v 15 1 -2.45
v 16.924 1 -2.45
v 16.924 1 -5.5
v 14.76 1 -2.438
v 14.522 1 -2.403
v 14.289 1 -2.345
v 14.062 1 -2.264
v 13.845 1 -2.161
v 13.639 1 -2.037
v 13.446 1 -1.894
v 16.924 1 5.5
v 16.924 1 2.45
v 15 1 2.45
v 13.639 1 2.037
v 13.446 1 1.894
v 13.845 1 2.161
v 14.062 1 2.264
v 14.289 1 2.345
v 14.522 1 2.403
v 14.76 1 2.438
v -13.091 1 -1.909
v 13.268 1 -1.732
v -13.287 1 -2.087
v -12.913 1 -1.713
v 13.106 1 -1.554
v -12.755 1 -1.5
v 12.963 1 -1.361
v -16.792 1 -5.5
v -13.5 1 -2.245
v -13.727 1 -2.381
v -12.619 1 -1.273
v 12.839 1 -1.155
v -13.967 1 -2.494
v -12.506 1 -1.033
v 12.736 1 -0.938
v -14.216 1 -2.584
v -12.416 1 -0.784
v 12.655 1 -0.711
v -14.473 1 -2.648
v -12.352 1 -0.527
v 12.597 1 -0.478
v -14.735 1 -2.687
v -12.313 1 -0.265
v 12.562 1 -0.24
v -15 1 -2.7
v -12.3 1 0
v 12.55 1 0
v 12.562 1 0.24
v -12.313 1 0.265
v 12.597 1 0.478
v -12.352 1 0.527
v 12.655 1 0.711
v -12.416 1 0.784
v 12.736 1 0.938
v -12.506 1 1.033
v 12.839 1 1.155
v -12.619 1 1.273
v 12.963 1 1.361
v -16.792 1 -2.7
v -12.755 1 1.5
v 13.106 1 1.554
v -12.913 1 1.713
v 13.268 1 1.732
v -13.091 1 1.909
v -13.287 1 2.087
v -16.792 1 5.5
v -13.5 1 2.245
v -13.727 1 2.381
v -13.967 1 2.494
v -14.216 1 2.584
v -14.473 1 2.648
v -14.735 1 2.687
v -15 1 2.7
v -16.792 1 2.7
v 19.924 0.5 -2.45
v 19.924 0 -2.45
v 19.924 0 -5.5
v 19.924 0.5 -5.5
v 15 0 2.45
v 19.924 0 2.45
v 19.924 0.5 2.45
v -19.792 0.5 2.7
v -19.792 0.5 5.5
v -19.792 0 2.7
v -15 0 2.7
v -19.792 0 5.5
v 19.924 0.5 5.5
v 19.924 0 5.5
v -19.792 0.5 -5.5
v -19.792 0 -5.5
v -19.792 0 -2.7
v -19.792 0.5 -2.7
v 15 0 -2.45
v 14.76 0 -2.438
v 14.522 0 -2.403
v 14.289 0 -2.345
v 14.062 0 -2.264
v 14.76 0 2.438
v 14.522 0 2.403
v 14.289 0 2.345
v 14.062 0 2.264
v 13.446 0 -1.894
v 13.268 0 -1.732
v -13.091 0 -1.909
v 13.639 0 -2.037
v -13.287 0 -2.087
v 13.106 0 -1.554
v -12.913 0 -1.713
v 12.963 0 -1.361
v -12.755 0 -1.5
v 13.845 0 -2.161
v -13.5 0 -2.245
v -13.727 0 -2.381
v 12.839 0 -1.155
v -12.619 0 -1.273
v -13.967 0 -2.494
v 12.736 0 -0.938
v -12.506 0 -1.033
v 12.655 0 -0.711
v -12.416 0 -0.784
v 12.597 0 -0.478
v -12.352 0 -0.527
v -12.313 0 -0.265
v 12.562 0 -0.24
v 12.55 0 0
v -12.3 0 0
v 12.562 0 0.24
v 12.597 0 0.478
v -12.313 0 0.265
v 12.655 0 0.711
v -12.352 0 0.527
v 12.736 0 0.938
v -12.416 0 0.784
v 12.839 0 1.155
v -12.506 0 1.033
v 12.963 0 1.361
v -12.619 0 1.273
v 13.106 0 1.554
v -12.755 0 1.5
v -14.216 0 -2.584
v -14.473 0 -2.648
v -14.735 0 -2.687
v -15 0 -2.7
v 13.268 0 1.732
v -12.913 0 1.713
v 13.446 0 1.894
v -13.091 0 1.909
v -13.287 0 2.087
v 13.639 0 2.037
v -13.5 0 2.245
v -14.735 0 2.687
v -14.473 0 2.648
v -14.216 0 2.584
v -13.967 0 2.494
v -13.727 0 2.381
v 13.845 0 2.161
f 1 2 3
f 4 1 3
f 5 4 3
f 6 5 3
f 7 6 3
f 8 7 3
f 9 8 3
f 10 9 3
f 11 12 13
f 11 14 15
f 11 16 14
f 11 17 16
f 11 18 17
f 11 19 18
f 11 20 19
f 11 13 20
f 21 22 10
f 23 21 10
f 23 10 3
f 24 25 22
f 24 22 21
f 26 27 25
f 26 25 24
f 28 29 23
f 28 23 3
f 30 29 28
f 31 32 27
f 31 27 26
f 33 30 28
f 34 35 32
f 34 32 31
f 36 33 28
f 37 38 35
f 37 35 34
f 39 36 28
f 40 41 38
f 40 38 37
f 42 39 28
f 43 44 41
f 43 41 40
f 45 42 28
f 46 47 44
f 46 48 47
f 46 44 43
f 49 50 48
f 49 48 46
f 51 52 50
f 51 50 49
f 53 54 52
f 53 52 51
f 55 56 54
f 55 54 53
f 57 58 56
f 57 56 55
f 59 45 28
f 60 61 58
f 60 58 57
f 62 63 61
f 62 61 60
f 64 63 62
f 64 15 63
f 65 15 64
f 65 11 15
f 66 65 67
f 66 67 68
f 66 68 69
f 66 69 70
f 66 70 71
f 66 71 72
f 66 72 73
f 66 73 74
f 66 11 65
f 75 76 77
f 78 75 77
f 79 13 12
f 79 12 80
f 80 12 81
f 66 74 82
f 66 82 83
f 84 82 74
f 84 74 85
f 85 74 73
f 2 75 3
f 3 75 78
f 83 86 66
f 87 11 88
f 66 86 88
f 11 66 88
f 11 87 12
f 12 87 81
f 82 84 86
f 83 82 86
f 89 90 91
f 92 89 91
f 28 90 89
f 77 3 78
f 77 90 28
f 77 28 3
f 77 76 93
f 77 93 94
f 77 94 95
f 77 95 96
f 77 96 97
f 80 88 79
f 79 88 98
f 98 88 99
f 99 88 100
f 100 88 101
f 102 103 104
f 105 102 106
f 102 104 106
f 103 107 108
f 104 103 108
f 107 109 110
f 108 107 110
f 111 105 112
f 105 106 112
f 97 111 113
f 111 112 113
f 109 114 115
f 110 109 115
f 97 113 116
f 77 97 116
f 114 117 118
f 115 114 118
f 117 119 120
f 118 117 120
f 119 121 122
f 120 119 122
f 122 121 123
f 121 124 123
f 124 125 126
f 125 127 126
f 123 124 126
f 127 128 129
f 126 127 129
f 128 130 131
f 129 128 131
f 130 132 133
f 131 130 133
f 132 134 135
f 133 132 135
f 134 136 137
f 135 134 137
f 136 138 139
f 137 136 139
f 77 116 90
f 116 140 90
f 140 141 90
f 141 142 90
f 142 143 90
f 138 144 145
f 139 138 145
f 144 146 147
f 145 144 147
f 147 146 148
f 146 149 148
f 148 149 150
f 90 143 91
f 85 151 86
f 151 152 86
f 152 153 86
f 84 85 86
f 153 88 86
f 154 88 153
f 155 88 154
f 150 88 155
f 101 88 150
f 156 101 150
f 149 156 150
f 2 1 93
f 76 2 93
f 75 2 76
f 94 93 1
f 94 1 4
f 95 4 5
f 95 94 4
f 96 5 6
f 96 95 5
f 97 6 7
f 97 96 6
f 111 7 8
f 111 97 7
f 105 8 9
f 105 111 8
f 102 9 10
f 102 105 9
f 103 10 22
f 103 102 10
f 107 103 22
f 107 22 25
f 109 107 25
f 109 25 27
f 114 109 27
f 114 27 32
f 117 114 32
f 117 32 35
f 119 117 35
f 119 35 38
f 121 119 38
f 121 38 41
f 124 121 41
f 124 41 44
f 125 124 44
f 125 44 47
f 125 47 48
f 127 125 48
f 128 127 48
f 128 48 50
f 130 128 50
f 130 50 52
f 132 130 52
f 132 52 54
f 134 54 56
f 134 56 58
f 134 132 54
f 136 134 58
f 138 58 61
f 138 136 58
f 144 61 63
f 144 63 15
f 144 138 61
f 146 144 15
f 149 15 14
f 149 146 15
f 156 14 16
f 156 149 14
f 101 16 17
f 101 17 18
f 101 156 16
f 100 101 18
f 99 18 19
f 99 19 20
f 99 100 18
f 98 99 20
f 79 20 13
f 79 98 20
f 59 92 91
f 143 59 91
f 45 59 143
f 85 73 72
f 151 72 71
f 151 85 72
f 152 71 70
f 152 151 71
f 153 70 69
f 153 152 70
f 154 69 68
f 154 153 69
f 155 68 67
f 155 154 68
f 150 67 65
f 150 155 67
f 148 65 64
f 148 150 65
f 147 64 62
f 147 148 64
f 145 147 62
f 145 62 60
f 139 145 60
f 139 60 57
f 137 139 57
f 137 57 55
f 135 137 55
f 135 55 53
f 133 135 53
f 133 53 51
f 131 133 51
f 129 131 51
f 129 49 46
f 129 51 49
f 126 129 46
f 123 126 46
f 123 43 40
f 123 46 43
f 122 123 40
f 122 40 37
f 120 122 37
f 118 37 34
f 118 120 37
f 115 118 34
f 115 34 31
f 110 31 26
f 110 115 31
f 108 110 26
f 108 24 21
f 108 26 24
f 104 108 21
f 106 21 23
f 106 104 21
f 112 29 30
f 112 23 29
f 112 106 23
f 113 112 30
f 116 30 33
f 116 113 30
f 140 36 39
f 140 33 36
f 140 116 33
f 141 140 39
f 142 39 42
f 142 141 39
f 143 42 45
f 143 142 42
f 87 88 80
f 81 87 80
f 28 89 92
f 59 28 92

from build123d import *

# Parameters (mm, degrees)
SKETCH1_R           = 2.7
SKETCH1_R_2         = 2.45
BOSS_EXTRUDE1_DEPTH = 1
SKETCH2_W           = 5.5
SKETCH2_H           = 5.4
SKETCH2_H_2         = 4.9
CUT_EXTRUDE1_DEPTH  = 2
BOSS_EXTRUDE2_DEPTH = 1
CHAMFER1_SIZE       = 3
CHAMFER1_SIZE2      = 0.5


with BuildPart() as part:
    # Sketch1 → Boss-Extrude1 (new body)
    with BuildSketch(Plane(origin=(0, 0, 0), x_dir=(1, 0, 0), z_dir=(0, 1, 0))):
        with BuildLine():
            Line((-15, 5.5), (15, 5.5))
            ThreePointArc((15, 5.5), (20.5, 0), (15, -5.5))
            Line((15, -5.5), (-15, -5.5))
            ThreePointArc((-15, -5.5), (-20.5, 0), (-15, 5.5))
        make_face()
        with Locations((-15, 0)):
            Circle(SKETCH1_R, mode=Mode.SUBTRACT)
        with Locations((15, 0)):
            Circle(SKETCH1_R_2, mode=Mode.SUBTRACT)
    extrude(amount=BOSS_EXTRUDE1_DEPTH)

    # Sketch2 → Cut-Extrude1 (cut, through all)
    with BuildSketch(Plane(origin=(0, 1, 0), x_dir=(1, 0, 0), z_dir=(0, 1, 0))):
        with Locations((-17.75, 0)):
            Rectangle(SKETCH2_W, SKETCH2_H)
        with Locations((17.75, 0)):
            Rectangle(SKETCH2_W, SKETCH2_H_2)
    extrude(amount=-CUT_EXTRUDE1_DEPTH, mode=Mode.SUBTRACT)

    # Sketch3 → Boss-Extrude2 (add)
    with BuildSketch(Plane.XZ):
        with BuildLine():
            Line((-19.79165942, 2.7), (-19.79165942, 5.5))
            Line((-19.79165942, 5.5), (-15, 5.5))
            ThreePointArc((-15, 5.5), (-17.774887385, 4.748684028), (-19.79165942, 2.7))
        make_face()
        with BuildLine():
            Line((15, 5.5), (19.924175058, 5.5))
            Line((19.924175058, 5.5), (19.924175058, 2.45))
            ThreePointArc((19.924175058, 2.45), (17.896118092, 4.675735236), (15, 5.5))
        make_face()
        with BuildLine():
            Line((19.924175058, -2.45), (19.924175058, -5.5))
            Line((19.924175058, -5.5), (15, -5.5))
            ThreePointArc((15, -5.5), (17.896118092, -4.675735236), (19.924175058, -2.45))
        make_face()
        with BuildLine():
            Line((-15, -5.5), (-19.79165942, -5.5))
            Line((-19.79165942, -5.5), (-19.79165942, -2.7))
            ThreePointArc((-19.79165942, -2.7), (-17.774887385, -4.748684028), (-15, -5.5))
        make_face()
    extrude(amount=-BOSS_EXTRUDE2_DEPTH)

    # Chamfer1
    chamfer1_edges = [part.edges().sort_by_distance(p)[0] for p in [
        (19.924175058, 1, -3.975),
        (-19.79165942, 1, 4.1),
        (-19.79165942, 1, -4.1),
        (19.924175058, 1, 3.975),
    ]]
    chamfer1_side = [part.faces().sort_by_distance(p)[0] for p in [
        (0.231556515, 1, 0),
    ]]
    chamfer(chamfer1_edges, length=CHAMFER1_SIZE, length2=CHAMFER1_SIZE2, reference=chamfer1_side[0])


solid = part.part
